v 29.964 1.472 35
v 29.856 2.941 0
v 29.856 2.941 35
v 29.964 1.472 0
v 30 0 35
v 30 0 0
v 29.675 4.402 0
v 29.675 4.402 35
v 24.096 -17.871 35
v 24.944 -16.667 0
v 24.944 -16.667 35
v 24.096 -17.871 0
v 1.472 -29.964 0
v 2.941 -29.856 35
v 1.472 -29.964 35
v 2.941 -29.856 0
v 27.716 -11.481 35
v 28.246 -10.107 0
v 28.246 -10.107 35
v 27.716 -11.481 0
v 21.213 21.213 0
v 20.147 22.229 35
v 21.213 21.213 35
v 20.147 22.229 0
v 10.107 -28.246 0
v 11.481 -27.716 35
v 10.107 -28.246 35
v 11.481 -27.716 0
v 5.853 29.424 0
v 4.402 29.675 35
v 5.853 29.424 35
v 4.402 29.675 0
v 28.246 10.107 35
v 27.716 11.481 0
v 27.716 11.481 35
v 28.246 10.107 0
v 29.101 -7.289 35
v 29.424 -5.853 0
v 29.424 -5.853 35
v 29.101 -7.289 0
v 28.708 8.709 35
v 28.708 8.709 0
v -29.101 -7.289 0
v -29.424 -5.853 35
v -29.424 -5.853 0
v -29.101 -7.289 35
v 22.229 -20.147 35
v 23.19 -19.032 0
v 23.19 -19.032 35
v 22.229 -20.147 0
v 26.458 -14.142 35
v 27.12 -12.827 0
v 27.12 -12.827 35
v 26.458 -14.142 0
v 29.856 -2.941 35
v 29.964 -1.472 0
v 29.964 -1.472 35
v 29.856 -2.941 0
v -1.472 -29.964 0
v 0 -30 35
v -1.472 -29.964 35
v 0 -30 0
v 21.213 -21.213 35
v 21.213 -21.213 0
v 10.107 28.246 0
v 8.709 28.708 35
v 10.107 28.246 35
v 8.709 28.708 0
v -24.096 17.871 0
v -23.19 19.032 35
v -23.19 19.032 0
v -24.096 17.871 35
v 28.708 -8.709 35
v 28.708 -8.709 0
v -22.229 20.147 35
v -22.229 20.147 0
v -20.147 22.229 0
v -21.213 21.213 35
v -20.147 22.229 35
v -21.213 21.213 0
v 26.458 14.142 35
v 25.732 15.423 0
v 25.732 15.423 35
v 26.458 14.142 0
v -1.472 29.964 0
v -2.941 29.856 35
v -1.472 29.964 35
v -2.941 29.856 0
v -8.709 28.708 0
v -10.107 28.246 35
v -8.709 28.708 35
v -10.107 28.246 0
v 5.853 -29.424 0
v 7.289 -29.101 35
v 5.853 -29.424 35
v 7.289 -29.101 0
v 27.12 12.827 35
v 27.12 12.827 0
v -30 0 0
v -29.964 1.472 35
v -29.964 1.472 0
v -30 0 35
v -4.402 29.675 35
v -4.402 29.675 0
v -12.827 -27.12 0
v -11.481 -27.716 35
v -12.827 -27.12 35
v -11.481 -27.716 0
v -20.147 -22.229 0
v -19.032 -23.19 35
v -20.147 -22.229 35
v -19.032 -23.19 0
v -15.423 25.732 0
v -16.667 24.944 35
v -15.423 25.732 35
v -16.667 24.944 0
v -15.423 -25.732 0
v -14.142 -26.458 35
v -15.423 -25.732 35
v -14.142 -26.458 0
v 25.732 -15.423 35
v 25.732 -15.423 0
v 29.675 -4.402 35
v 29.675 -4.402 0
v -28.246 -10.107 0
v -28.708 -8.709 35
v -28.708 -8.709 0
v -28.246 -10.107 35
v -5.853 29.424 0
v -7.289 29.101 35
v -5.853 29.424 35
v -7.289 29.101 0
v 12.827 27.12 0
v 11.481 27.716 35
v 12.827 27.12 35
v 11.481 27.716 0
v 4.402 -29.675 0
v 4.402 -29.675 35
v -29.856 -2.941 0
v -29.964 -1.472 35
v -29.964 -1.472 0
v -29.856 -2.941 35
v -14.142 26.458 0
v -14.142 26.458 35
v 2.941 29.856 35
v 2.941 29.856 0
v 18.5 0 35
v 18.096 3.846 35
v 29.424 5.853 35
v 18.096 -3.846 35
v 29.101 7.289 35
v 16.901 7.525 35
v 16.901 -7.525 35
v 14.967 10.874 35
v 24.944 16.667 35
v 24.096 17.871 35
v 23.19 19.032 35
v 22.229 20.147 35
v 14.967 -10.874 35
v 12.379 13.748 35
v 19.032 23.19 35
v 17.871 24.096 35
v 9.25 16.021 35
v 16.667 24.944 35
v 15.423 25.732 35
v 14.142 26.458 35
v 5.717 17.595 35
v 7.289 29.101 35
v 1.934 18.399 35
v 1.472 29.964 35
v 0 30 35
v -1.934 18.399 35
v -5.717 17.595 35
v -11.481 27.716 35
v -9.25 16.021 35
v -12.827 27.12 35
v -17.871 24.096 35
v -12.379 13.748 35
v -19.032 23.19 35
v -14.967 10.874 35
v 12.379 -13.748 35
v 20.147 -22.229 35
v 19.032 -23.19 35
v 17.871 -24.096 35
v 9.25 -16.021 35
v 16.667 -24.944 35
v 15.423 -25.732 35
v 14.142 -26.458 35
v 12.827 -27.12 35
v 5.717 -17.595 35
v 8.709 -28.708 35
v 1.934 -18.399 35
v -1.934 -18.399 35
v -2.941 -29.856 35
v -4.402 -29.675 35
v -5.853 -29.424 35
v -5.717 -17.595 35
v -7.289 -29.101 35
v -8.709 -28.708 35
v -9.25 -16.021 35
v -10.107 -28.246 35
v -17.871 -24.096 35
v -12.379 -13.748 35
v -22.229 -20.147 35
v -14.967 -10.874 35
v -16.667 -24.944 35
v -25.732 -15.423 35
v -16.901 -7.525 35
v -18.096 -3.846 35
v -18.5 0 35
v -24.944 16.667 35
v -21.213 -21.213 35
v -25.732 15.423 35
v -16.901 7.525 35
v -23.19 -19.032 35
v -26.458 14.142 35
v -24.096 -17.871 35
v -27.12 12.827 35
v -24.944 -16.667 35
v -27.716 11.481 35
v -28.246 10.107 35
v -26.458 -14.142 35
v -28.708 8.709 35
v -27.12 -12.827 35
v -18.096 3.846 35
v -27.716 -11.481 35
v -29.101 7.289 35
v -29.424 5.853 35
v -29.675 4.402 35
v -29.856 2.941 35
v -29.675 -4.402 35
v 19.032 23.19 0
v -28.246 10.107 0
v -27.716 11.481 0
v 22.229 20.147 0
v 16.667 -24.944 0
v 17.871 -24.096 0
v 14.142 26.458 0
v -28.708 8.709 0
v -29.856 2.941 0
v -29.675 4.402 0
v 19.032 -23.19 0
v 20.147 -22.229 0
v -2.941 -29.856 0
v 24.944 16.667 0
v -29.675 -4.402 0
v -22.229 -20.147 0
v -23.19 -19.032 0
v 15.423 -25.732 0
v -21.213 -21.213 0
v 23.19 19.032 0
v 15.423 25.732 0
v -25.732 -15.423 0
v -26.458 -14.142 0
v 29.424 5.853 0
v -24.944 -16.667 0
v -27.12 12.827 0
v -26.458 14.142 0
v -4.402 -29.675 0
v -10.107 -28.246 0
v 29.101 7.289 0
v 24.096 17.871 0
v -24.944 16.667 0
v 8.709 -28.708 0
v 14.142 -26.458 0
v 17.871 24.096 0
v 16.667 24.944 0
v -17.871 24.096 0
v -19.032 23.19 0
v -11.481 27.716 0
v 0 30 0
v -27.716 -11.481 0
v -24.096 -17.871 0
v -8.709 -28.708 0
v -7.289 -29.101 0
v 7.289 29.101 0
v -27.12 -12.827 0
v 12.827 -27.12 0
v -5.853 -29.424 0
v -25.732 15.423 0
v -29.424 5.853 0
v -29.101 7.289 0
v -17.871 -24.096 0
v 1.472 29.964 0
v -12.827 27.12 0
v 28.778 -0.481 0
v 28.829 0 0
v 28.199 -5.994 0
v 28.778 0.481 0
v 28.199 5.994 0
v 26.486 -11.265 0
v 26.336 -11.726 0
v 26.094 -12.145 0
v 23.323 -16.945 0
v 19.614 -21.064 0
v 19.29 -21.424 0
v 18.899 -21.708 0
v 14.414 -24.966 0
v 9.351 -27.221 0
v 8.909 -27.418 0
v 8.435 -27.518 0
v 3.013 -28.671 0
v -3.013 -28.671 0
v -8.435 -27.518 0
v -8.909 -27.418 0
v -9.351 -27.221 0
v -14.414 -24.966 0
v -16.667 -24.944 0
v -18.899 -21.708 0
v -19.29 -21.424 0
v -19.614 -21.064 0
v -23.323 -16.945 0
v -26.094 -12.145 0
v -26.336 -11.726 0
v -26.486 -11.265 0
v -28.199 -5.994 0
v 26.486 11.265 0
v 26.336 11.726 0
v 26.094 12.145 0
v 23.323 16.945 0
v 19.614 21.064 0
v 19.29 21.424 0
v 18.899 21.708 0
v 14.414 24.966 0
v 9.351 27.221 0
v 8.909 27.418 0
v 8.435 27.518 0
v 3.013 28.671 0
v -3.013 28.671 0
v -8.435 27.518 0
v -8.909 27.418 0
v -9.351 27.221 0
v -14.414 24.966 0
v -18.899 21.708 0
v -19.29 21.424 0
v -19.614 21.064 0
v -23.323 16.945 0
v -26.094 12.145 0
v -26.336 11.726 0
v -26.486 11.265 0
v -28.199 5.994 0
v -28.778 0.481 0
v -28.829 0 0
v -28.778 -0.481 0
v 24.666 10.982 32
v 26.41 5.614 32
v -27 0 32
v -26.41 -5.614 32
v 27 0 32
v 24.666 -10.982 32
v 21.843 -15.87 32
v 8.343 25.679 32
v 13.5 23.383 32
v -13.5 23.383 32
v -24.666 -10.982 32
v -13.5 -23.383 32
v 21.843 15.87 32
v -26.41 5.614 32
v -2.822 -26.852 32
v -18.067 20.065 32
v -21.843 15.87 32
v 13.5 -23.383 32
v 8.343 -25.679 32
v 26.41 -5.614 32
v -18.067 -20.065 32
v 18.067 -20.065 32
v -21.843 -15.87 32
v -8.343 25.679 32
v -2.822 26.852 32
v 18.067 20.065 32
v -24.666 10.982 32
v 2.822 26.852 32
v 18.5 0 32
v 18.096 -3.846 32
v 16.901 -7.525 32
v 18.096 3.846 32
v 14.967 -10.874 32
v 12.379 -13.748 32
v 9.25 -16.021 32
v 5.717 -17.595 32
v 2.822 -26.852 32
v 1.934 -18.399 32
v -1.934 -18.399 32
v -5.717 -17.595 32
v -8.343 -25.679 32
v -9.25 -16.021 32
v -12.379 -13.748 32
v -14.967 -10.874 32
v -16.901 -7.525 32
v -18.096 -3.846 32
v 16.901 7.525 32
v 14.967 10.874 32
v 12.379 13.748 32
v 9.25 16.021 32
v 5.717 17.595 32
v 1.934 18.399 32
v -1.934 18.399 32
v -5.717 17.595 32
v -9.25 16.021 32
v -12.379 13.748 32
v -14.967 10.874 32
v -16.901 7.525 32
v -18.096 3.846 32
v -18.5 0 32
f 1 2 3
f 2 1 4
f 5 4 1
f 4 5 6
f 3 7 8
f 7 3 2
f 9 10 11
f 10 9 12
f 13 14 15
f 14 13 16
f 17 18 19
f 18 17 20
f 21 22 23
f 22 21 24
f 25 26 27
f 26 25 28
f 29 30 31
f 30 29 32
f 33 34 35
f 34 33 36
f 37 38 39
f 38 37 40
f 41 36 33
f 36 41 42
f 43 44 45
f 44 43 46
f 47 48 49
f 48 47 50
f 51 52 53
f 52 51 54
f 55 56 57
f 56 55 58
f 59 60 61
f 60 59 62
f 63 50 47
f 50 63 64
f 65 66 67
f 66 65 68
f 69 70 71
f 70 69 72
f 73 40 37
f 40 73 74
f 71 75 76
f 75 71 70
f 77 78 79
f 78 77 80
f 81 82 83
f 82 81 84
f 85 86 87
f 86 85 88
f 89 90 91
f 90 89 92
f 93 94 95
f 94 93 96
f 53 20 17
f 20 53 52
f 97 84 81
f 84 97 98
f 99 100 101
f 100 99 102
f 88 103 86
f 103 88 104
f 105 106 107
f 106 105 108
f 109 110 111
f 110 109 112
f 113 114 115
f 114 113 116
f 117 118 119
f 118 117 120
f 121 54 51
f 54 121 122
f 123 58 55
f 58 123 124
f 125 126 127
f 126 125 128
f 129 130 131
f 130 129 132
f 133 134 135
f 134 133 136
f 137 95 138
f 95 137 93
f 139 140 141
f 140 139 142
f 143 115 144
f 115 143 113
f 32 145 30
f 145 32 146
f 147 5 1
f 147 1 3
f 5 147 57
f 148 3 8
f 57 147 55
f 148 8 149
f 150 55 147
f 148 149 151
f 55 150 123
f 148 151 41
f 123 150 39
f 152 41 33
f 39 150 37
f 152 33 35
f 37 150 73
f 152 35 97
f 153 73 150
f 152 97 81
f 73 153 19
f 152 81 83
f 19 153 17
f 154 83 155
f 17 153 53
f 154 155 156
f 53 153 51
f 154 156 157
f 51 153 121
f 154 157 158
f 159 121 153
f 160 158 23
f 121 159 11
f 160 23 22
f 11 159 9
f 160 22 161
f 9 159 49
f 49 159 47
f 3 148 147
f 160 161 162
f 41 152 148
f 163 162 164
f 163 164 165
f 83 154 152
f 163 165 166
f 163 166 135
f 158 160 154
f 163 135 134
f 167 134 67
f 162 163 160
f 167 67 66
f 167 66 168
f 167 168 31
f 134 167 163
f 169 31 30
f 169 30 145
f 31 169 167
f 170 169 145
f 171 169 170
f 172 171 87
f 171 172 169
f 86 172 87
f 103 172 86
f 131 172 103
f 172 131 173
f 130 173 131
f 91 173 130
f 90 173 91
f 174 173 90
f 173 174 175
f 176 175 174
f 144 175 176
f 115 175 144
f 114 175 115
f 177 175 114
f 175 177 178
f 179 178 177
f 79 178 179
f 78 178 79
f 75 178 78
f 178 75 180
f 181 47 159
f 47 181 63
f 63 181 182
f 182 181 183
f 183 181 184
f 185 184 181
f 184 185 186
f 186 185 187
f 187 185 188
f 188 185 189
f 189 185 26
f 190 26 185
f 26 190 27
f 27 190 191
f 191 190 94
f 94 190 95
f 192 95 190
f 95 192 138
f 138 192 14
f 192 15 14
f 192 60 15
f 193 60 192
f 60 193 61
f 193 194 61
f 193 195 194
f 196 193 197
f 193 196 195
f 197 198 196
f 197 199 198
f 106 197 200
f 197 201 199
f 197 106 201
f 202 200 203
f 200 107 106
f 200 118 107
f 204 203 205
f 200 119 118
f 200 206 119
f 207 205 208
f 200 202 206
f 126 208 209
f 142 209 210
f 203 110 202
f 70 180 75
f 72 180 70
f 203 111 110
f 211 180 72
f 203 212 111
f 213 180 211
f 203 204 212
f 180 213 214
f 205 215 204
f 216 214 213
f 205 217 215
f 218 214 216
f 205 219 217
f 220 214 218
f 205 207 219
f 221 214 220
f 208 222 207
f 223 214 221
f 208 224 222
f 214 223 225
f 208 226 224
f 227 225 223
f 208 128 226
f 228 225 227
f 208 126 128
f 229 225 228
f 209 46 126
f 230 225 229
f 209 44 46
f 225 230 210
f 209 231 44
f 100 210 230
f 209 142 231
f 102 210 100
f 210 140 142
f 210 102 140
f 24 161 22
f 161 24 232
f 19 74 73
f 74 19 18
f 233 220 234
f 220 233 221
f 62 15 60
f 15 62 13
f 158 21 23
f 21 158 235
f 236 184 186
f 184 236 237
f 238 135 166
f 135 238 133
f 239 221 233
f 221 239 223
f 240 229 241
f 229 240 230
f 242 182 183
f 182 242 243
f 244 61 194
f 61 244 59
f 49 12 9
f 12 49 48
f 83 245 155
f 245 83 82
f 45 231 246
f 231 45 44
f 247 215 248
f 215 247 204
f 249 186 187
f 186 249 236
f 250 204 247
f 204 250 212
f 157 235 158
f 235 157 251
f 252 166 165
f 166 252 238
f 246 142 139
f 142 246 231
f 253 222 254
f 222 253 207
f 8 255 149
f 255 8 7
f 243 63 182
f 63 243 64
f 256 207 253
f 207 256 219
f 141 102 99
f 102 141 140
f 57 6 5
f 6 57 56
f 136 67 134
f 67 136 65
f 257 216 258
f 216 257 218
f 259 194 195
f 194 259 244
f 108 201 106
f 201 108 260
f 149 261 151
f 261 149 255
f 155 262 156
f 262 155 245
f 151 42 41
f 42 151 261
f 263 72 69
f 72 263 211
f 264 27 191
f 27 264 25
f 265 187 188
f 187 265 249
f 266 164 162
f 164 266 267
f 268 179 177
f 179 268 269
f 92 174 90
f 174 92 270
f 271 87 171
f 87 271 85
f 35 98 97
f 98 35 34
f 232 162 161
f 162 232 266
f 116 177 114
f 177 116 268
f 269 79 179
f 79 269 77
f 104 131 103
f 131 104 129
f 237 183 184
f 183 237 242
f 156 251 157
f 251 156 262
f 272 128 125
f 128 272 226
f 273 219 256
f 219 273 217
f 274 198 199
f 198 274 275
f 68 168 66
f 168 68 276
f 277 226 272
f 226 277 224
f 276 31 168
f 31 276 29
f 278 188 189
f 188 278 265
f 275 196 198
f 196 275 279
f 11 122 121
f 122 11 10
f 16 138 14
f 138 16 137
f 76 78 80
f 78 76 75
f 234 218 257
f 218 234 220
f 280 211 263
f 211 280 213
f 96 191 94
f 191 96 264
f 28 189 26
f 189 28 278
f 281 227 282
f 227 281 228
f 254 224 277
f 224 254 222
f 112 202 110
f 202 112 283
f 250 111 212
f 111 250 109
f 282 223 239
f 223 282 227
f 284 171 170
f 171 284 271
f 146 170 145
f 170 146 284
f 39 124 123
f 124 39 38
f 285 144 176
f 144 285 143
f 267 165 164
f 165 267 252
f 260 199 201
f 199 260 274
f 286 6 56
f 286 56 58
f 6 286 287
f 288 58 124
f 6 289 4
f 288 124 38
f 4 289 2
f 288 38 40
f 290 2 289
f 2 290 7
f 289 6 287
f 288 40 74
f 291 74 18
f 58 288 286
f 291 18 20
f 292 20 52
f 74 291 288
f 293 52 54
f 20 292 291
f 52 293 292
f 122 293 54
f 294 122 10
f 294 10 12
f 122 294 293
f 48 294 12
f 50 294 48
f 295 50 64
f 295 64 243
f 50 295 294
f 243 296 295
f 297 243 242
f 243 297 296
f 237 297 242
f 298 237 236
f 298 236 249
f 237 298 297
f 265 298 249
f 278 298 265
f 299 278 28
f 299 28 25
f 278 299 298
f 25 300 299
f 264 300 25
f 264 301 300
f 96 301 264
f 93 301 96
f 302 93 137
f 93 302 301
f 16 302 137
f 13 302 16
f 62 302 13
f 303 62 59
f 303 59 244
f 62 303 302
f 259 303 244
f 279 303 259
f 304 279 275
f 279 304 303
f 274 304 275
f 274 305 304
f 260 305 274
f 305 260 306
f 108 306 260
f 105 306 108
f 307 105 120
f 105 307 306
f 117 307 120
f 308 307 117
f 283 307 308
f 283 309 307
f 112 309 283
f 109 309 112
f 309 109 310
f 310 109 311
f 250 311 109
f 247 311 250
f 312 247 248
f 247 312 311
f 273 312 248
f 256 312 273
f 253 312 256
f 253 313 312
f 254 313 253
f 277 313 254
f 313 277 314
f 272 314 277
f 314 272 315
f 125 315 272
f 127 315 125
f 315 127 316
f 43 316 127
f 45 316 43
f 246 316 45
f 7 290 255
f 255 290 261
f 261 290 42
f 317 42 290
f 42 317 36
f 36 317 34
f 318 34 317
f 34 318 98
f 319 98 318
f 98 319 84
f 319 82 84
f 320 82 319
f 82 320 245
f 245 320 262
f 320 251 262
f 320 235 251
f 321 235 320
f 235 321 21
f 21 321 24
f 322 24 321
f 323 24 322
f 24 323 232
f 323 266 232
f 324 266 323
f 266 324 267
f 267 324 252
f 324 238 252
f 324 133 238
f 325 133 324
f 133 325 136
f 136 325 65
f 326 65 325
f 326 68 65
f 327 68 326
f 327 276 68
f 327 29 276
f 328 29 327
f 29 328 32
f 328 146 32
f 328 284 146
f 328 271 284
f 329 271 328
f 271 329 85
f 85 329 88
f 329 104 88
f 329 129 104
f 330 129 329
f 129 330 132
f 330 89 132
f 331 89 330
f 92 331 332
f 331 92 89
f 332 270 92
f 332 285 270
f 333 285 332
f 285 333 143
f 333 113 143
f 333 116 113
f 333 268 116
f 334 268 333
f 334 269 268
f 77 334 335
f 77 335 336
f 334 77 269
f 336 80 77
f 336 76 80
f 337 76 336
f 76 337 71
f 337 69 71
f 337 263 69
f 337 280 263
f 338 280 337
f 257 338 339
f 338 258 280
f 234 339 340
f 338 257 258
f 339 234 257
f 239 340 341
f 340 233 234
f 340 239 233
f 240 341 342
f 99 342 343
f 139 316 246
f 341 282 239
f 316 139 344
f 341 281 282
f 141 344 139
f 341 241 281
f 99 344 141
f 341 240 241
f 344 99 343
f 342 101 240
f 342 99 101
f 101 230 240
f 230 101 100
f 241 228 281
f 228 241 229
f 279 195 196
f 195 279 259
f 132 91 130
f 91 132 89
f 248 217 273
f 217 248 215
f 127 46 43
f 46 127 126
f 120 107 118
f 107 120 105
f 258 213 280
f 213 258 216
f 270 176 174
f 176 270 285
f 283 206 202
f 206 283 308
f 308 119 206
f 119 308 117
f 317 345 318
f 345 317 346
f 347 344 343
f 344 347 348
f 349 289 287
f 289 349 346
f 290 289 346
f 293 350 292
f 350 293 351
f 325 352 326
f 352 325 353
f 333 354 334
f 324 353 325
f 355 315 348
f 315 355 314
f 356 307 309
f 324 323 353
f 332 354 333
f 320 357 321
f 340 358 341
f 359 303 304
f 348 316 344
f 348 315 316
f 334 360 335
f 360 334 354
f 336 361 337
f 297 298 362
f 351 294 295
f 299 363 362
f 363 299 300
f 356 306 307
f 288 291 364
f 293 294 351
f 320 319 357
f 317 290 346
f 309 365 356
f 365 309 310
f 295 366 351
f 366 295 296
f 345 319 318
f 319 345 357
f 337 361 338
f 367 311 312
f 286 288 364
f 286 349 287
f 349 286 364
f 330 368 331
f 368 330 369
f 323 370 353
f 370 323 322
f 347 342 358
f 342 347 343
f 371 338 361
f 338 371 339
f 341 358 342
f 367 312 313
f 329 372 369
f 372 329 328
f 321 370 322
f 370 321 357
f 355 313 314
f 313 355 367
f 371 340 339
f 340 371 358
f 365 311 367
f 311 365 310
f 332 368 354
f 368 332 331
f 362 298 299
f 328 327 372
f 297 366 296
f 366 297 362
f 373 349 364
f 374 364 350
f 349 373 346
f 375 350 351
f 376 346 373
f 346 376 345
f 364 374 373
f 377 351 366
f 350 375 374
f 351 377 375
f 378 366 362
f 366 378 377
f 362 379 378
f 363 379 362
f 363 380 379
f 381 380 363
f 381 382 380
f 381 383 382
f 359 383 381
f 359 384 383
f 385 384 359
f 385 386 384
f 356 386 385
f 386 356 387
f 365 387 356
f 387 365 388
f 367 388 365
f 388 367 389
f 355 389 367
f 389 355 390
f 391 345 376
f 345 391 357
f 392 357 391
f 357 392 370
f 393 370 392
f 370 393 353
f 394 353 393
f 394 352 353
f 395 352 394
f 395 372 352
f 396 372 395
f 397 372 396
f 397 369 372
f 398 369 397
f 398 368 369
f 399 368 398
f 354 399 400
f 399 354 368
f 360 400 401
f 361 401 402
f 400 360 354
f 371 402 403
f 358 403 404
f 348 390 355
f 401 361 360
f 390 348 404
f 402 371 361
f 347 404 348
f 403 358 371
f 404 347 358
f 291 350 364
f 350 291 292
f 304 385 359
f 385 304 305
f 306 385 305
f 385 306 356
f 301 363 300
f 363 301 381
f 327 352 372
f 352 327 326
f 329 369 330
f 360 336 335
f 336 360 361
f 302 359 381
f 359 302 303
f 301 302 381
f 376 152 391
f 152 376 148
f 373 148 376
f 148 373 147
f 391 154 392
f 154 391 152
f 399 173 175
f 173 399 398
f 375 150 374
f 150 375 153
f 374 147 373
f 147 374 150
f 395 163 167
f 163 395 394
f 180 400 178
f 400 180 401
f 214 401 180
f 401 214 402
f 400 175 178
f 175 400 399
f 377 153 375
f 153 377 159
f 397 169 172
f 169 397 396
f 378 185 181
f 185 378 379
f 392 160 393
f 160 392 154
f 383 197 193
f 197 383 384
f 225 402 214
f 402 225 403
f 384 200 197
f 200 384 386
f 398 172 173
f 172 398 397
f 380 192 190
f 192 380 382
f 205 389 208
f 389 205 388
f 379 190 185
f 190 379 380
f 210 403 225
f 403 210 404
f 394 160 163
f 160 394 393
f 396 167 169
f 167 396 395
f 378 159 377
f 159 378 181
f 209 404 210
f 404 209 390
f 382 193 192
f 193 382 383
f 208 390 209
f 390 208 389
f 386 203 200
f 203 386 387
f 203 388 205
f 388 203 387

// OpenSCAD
difference(){
cylinder(r=30,h=35,$fn=128);
translate([0,0,-3])cylinder(r1=30-1,r2=30-3,h=35);
    translate([0,0,3])cylinder(r=37/2,h=35);
rotate([0,0,60])translate([0,7,30])cube([8,2,20],center=true);
rotate([0,0,-60])translate([0,7,30])cube([8,2,20],center=true);
}
